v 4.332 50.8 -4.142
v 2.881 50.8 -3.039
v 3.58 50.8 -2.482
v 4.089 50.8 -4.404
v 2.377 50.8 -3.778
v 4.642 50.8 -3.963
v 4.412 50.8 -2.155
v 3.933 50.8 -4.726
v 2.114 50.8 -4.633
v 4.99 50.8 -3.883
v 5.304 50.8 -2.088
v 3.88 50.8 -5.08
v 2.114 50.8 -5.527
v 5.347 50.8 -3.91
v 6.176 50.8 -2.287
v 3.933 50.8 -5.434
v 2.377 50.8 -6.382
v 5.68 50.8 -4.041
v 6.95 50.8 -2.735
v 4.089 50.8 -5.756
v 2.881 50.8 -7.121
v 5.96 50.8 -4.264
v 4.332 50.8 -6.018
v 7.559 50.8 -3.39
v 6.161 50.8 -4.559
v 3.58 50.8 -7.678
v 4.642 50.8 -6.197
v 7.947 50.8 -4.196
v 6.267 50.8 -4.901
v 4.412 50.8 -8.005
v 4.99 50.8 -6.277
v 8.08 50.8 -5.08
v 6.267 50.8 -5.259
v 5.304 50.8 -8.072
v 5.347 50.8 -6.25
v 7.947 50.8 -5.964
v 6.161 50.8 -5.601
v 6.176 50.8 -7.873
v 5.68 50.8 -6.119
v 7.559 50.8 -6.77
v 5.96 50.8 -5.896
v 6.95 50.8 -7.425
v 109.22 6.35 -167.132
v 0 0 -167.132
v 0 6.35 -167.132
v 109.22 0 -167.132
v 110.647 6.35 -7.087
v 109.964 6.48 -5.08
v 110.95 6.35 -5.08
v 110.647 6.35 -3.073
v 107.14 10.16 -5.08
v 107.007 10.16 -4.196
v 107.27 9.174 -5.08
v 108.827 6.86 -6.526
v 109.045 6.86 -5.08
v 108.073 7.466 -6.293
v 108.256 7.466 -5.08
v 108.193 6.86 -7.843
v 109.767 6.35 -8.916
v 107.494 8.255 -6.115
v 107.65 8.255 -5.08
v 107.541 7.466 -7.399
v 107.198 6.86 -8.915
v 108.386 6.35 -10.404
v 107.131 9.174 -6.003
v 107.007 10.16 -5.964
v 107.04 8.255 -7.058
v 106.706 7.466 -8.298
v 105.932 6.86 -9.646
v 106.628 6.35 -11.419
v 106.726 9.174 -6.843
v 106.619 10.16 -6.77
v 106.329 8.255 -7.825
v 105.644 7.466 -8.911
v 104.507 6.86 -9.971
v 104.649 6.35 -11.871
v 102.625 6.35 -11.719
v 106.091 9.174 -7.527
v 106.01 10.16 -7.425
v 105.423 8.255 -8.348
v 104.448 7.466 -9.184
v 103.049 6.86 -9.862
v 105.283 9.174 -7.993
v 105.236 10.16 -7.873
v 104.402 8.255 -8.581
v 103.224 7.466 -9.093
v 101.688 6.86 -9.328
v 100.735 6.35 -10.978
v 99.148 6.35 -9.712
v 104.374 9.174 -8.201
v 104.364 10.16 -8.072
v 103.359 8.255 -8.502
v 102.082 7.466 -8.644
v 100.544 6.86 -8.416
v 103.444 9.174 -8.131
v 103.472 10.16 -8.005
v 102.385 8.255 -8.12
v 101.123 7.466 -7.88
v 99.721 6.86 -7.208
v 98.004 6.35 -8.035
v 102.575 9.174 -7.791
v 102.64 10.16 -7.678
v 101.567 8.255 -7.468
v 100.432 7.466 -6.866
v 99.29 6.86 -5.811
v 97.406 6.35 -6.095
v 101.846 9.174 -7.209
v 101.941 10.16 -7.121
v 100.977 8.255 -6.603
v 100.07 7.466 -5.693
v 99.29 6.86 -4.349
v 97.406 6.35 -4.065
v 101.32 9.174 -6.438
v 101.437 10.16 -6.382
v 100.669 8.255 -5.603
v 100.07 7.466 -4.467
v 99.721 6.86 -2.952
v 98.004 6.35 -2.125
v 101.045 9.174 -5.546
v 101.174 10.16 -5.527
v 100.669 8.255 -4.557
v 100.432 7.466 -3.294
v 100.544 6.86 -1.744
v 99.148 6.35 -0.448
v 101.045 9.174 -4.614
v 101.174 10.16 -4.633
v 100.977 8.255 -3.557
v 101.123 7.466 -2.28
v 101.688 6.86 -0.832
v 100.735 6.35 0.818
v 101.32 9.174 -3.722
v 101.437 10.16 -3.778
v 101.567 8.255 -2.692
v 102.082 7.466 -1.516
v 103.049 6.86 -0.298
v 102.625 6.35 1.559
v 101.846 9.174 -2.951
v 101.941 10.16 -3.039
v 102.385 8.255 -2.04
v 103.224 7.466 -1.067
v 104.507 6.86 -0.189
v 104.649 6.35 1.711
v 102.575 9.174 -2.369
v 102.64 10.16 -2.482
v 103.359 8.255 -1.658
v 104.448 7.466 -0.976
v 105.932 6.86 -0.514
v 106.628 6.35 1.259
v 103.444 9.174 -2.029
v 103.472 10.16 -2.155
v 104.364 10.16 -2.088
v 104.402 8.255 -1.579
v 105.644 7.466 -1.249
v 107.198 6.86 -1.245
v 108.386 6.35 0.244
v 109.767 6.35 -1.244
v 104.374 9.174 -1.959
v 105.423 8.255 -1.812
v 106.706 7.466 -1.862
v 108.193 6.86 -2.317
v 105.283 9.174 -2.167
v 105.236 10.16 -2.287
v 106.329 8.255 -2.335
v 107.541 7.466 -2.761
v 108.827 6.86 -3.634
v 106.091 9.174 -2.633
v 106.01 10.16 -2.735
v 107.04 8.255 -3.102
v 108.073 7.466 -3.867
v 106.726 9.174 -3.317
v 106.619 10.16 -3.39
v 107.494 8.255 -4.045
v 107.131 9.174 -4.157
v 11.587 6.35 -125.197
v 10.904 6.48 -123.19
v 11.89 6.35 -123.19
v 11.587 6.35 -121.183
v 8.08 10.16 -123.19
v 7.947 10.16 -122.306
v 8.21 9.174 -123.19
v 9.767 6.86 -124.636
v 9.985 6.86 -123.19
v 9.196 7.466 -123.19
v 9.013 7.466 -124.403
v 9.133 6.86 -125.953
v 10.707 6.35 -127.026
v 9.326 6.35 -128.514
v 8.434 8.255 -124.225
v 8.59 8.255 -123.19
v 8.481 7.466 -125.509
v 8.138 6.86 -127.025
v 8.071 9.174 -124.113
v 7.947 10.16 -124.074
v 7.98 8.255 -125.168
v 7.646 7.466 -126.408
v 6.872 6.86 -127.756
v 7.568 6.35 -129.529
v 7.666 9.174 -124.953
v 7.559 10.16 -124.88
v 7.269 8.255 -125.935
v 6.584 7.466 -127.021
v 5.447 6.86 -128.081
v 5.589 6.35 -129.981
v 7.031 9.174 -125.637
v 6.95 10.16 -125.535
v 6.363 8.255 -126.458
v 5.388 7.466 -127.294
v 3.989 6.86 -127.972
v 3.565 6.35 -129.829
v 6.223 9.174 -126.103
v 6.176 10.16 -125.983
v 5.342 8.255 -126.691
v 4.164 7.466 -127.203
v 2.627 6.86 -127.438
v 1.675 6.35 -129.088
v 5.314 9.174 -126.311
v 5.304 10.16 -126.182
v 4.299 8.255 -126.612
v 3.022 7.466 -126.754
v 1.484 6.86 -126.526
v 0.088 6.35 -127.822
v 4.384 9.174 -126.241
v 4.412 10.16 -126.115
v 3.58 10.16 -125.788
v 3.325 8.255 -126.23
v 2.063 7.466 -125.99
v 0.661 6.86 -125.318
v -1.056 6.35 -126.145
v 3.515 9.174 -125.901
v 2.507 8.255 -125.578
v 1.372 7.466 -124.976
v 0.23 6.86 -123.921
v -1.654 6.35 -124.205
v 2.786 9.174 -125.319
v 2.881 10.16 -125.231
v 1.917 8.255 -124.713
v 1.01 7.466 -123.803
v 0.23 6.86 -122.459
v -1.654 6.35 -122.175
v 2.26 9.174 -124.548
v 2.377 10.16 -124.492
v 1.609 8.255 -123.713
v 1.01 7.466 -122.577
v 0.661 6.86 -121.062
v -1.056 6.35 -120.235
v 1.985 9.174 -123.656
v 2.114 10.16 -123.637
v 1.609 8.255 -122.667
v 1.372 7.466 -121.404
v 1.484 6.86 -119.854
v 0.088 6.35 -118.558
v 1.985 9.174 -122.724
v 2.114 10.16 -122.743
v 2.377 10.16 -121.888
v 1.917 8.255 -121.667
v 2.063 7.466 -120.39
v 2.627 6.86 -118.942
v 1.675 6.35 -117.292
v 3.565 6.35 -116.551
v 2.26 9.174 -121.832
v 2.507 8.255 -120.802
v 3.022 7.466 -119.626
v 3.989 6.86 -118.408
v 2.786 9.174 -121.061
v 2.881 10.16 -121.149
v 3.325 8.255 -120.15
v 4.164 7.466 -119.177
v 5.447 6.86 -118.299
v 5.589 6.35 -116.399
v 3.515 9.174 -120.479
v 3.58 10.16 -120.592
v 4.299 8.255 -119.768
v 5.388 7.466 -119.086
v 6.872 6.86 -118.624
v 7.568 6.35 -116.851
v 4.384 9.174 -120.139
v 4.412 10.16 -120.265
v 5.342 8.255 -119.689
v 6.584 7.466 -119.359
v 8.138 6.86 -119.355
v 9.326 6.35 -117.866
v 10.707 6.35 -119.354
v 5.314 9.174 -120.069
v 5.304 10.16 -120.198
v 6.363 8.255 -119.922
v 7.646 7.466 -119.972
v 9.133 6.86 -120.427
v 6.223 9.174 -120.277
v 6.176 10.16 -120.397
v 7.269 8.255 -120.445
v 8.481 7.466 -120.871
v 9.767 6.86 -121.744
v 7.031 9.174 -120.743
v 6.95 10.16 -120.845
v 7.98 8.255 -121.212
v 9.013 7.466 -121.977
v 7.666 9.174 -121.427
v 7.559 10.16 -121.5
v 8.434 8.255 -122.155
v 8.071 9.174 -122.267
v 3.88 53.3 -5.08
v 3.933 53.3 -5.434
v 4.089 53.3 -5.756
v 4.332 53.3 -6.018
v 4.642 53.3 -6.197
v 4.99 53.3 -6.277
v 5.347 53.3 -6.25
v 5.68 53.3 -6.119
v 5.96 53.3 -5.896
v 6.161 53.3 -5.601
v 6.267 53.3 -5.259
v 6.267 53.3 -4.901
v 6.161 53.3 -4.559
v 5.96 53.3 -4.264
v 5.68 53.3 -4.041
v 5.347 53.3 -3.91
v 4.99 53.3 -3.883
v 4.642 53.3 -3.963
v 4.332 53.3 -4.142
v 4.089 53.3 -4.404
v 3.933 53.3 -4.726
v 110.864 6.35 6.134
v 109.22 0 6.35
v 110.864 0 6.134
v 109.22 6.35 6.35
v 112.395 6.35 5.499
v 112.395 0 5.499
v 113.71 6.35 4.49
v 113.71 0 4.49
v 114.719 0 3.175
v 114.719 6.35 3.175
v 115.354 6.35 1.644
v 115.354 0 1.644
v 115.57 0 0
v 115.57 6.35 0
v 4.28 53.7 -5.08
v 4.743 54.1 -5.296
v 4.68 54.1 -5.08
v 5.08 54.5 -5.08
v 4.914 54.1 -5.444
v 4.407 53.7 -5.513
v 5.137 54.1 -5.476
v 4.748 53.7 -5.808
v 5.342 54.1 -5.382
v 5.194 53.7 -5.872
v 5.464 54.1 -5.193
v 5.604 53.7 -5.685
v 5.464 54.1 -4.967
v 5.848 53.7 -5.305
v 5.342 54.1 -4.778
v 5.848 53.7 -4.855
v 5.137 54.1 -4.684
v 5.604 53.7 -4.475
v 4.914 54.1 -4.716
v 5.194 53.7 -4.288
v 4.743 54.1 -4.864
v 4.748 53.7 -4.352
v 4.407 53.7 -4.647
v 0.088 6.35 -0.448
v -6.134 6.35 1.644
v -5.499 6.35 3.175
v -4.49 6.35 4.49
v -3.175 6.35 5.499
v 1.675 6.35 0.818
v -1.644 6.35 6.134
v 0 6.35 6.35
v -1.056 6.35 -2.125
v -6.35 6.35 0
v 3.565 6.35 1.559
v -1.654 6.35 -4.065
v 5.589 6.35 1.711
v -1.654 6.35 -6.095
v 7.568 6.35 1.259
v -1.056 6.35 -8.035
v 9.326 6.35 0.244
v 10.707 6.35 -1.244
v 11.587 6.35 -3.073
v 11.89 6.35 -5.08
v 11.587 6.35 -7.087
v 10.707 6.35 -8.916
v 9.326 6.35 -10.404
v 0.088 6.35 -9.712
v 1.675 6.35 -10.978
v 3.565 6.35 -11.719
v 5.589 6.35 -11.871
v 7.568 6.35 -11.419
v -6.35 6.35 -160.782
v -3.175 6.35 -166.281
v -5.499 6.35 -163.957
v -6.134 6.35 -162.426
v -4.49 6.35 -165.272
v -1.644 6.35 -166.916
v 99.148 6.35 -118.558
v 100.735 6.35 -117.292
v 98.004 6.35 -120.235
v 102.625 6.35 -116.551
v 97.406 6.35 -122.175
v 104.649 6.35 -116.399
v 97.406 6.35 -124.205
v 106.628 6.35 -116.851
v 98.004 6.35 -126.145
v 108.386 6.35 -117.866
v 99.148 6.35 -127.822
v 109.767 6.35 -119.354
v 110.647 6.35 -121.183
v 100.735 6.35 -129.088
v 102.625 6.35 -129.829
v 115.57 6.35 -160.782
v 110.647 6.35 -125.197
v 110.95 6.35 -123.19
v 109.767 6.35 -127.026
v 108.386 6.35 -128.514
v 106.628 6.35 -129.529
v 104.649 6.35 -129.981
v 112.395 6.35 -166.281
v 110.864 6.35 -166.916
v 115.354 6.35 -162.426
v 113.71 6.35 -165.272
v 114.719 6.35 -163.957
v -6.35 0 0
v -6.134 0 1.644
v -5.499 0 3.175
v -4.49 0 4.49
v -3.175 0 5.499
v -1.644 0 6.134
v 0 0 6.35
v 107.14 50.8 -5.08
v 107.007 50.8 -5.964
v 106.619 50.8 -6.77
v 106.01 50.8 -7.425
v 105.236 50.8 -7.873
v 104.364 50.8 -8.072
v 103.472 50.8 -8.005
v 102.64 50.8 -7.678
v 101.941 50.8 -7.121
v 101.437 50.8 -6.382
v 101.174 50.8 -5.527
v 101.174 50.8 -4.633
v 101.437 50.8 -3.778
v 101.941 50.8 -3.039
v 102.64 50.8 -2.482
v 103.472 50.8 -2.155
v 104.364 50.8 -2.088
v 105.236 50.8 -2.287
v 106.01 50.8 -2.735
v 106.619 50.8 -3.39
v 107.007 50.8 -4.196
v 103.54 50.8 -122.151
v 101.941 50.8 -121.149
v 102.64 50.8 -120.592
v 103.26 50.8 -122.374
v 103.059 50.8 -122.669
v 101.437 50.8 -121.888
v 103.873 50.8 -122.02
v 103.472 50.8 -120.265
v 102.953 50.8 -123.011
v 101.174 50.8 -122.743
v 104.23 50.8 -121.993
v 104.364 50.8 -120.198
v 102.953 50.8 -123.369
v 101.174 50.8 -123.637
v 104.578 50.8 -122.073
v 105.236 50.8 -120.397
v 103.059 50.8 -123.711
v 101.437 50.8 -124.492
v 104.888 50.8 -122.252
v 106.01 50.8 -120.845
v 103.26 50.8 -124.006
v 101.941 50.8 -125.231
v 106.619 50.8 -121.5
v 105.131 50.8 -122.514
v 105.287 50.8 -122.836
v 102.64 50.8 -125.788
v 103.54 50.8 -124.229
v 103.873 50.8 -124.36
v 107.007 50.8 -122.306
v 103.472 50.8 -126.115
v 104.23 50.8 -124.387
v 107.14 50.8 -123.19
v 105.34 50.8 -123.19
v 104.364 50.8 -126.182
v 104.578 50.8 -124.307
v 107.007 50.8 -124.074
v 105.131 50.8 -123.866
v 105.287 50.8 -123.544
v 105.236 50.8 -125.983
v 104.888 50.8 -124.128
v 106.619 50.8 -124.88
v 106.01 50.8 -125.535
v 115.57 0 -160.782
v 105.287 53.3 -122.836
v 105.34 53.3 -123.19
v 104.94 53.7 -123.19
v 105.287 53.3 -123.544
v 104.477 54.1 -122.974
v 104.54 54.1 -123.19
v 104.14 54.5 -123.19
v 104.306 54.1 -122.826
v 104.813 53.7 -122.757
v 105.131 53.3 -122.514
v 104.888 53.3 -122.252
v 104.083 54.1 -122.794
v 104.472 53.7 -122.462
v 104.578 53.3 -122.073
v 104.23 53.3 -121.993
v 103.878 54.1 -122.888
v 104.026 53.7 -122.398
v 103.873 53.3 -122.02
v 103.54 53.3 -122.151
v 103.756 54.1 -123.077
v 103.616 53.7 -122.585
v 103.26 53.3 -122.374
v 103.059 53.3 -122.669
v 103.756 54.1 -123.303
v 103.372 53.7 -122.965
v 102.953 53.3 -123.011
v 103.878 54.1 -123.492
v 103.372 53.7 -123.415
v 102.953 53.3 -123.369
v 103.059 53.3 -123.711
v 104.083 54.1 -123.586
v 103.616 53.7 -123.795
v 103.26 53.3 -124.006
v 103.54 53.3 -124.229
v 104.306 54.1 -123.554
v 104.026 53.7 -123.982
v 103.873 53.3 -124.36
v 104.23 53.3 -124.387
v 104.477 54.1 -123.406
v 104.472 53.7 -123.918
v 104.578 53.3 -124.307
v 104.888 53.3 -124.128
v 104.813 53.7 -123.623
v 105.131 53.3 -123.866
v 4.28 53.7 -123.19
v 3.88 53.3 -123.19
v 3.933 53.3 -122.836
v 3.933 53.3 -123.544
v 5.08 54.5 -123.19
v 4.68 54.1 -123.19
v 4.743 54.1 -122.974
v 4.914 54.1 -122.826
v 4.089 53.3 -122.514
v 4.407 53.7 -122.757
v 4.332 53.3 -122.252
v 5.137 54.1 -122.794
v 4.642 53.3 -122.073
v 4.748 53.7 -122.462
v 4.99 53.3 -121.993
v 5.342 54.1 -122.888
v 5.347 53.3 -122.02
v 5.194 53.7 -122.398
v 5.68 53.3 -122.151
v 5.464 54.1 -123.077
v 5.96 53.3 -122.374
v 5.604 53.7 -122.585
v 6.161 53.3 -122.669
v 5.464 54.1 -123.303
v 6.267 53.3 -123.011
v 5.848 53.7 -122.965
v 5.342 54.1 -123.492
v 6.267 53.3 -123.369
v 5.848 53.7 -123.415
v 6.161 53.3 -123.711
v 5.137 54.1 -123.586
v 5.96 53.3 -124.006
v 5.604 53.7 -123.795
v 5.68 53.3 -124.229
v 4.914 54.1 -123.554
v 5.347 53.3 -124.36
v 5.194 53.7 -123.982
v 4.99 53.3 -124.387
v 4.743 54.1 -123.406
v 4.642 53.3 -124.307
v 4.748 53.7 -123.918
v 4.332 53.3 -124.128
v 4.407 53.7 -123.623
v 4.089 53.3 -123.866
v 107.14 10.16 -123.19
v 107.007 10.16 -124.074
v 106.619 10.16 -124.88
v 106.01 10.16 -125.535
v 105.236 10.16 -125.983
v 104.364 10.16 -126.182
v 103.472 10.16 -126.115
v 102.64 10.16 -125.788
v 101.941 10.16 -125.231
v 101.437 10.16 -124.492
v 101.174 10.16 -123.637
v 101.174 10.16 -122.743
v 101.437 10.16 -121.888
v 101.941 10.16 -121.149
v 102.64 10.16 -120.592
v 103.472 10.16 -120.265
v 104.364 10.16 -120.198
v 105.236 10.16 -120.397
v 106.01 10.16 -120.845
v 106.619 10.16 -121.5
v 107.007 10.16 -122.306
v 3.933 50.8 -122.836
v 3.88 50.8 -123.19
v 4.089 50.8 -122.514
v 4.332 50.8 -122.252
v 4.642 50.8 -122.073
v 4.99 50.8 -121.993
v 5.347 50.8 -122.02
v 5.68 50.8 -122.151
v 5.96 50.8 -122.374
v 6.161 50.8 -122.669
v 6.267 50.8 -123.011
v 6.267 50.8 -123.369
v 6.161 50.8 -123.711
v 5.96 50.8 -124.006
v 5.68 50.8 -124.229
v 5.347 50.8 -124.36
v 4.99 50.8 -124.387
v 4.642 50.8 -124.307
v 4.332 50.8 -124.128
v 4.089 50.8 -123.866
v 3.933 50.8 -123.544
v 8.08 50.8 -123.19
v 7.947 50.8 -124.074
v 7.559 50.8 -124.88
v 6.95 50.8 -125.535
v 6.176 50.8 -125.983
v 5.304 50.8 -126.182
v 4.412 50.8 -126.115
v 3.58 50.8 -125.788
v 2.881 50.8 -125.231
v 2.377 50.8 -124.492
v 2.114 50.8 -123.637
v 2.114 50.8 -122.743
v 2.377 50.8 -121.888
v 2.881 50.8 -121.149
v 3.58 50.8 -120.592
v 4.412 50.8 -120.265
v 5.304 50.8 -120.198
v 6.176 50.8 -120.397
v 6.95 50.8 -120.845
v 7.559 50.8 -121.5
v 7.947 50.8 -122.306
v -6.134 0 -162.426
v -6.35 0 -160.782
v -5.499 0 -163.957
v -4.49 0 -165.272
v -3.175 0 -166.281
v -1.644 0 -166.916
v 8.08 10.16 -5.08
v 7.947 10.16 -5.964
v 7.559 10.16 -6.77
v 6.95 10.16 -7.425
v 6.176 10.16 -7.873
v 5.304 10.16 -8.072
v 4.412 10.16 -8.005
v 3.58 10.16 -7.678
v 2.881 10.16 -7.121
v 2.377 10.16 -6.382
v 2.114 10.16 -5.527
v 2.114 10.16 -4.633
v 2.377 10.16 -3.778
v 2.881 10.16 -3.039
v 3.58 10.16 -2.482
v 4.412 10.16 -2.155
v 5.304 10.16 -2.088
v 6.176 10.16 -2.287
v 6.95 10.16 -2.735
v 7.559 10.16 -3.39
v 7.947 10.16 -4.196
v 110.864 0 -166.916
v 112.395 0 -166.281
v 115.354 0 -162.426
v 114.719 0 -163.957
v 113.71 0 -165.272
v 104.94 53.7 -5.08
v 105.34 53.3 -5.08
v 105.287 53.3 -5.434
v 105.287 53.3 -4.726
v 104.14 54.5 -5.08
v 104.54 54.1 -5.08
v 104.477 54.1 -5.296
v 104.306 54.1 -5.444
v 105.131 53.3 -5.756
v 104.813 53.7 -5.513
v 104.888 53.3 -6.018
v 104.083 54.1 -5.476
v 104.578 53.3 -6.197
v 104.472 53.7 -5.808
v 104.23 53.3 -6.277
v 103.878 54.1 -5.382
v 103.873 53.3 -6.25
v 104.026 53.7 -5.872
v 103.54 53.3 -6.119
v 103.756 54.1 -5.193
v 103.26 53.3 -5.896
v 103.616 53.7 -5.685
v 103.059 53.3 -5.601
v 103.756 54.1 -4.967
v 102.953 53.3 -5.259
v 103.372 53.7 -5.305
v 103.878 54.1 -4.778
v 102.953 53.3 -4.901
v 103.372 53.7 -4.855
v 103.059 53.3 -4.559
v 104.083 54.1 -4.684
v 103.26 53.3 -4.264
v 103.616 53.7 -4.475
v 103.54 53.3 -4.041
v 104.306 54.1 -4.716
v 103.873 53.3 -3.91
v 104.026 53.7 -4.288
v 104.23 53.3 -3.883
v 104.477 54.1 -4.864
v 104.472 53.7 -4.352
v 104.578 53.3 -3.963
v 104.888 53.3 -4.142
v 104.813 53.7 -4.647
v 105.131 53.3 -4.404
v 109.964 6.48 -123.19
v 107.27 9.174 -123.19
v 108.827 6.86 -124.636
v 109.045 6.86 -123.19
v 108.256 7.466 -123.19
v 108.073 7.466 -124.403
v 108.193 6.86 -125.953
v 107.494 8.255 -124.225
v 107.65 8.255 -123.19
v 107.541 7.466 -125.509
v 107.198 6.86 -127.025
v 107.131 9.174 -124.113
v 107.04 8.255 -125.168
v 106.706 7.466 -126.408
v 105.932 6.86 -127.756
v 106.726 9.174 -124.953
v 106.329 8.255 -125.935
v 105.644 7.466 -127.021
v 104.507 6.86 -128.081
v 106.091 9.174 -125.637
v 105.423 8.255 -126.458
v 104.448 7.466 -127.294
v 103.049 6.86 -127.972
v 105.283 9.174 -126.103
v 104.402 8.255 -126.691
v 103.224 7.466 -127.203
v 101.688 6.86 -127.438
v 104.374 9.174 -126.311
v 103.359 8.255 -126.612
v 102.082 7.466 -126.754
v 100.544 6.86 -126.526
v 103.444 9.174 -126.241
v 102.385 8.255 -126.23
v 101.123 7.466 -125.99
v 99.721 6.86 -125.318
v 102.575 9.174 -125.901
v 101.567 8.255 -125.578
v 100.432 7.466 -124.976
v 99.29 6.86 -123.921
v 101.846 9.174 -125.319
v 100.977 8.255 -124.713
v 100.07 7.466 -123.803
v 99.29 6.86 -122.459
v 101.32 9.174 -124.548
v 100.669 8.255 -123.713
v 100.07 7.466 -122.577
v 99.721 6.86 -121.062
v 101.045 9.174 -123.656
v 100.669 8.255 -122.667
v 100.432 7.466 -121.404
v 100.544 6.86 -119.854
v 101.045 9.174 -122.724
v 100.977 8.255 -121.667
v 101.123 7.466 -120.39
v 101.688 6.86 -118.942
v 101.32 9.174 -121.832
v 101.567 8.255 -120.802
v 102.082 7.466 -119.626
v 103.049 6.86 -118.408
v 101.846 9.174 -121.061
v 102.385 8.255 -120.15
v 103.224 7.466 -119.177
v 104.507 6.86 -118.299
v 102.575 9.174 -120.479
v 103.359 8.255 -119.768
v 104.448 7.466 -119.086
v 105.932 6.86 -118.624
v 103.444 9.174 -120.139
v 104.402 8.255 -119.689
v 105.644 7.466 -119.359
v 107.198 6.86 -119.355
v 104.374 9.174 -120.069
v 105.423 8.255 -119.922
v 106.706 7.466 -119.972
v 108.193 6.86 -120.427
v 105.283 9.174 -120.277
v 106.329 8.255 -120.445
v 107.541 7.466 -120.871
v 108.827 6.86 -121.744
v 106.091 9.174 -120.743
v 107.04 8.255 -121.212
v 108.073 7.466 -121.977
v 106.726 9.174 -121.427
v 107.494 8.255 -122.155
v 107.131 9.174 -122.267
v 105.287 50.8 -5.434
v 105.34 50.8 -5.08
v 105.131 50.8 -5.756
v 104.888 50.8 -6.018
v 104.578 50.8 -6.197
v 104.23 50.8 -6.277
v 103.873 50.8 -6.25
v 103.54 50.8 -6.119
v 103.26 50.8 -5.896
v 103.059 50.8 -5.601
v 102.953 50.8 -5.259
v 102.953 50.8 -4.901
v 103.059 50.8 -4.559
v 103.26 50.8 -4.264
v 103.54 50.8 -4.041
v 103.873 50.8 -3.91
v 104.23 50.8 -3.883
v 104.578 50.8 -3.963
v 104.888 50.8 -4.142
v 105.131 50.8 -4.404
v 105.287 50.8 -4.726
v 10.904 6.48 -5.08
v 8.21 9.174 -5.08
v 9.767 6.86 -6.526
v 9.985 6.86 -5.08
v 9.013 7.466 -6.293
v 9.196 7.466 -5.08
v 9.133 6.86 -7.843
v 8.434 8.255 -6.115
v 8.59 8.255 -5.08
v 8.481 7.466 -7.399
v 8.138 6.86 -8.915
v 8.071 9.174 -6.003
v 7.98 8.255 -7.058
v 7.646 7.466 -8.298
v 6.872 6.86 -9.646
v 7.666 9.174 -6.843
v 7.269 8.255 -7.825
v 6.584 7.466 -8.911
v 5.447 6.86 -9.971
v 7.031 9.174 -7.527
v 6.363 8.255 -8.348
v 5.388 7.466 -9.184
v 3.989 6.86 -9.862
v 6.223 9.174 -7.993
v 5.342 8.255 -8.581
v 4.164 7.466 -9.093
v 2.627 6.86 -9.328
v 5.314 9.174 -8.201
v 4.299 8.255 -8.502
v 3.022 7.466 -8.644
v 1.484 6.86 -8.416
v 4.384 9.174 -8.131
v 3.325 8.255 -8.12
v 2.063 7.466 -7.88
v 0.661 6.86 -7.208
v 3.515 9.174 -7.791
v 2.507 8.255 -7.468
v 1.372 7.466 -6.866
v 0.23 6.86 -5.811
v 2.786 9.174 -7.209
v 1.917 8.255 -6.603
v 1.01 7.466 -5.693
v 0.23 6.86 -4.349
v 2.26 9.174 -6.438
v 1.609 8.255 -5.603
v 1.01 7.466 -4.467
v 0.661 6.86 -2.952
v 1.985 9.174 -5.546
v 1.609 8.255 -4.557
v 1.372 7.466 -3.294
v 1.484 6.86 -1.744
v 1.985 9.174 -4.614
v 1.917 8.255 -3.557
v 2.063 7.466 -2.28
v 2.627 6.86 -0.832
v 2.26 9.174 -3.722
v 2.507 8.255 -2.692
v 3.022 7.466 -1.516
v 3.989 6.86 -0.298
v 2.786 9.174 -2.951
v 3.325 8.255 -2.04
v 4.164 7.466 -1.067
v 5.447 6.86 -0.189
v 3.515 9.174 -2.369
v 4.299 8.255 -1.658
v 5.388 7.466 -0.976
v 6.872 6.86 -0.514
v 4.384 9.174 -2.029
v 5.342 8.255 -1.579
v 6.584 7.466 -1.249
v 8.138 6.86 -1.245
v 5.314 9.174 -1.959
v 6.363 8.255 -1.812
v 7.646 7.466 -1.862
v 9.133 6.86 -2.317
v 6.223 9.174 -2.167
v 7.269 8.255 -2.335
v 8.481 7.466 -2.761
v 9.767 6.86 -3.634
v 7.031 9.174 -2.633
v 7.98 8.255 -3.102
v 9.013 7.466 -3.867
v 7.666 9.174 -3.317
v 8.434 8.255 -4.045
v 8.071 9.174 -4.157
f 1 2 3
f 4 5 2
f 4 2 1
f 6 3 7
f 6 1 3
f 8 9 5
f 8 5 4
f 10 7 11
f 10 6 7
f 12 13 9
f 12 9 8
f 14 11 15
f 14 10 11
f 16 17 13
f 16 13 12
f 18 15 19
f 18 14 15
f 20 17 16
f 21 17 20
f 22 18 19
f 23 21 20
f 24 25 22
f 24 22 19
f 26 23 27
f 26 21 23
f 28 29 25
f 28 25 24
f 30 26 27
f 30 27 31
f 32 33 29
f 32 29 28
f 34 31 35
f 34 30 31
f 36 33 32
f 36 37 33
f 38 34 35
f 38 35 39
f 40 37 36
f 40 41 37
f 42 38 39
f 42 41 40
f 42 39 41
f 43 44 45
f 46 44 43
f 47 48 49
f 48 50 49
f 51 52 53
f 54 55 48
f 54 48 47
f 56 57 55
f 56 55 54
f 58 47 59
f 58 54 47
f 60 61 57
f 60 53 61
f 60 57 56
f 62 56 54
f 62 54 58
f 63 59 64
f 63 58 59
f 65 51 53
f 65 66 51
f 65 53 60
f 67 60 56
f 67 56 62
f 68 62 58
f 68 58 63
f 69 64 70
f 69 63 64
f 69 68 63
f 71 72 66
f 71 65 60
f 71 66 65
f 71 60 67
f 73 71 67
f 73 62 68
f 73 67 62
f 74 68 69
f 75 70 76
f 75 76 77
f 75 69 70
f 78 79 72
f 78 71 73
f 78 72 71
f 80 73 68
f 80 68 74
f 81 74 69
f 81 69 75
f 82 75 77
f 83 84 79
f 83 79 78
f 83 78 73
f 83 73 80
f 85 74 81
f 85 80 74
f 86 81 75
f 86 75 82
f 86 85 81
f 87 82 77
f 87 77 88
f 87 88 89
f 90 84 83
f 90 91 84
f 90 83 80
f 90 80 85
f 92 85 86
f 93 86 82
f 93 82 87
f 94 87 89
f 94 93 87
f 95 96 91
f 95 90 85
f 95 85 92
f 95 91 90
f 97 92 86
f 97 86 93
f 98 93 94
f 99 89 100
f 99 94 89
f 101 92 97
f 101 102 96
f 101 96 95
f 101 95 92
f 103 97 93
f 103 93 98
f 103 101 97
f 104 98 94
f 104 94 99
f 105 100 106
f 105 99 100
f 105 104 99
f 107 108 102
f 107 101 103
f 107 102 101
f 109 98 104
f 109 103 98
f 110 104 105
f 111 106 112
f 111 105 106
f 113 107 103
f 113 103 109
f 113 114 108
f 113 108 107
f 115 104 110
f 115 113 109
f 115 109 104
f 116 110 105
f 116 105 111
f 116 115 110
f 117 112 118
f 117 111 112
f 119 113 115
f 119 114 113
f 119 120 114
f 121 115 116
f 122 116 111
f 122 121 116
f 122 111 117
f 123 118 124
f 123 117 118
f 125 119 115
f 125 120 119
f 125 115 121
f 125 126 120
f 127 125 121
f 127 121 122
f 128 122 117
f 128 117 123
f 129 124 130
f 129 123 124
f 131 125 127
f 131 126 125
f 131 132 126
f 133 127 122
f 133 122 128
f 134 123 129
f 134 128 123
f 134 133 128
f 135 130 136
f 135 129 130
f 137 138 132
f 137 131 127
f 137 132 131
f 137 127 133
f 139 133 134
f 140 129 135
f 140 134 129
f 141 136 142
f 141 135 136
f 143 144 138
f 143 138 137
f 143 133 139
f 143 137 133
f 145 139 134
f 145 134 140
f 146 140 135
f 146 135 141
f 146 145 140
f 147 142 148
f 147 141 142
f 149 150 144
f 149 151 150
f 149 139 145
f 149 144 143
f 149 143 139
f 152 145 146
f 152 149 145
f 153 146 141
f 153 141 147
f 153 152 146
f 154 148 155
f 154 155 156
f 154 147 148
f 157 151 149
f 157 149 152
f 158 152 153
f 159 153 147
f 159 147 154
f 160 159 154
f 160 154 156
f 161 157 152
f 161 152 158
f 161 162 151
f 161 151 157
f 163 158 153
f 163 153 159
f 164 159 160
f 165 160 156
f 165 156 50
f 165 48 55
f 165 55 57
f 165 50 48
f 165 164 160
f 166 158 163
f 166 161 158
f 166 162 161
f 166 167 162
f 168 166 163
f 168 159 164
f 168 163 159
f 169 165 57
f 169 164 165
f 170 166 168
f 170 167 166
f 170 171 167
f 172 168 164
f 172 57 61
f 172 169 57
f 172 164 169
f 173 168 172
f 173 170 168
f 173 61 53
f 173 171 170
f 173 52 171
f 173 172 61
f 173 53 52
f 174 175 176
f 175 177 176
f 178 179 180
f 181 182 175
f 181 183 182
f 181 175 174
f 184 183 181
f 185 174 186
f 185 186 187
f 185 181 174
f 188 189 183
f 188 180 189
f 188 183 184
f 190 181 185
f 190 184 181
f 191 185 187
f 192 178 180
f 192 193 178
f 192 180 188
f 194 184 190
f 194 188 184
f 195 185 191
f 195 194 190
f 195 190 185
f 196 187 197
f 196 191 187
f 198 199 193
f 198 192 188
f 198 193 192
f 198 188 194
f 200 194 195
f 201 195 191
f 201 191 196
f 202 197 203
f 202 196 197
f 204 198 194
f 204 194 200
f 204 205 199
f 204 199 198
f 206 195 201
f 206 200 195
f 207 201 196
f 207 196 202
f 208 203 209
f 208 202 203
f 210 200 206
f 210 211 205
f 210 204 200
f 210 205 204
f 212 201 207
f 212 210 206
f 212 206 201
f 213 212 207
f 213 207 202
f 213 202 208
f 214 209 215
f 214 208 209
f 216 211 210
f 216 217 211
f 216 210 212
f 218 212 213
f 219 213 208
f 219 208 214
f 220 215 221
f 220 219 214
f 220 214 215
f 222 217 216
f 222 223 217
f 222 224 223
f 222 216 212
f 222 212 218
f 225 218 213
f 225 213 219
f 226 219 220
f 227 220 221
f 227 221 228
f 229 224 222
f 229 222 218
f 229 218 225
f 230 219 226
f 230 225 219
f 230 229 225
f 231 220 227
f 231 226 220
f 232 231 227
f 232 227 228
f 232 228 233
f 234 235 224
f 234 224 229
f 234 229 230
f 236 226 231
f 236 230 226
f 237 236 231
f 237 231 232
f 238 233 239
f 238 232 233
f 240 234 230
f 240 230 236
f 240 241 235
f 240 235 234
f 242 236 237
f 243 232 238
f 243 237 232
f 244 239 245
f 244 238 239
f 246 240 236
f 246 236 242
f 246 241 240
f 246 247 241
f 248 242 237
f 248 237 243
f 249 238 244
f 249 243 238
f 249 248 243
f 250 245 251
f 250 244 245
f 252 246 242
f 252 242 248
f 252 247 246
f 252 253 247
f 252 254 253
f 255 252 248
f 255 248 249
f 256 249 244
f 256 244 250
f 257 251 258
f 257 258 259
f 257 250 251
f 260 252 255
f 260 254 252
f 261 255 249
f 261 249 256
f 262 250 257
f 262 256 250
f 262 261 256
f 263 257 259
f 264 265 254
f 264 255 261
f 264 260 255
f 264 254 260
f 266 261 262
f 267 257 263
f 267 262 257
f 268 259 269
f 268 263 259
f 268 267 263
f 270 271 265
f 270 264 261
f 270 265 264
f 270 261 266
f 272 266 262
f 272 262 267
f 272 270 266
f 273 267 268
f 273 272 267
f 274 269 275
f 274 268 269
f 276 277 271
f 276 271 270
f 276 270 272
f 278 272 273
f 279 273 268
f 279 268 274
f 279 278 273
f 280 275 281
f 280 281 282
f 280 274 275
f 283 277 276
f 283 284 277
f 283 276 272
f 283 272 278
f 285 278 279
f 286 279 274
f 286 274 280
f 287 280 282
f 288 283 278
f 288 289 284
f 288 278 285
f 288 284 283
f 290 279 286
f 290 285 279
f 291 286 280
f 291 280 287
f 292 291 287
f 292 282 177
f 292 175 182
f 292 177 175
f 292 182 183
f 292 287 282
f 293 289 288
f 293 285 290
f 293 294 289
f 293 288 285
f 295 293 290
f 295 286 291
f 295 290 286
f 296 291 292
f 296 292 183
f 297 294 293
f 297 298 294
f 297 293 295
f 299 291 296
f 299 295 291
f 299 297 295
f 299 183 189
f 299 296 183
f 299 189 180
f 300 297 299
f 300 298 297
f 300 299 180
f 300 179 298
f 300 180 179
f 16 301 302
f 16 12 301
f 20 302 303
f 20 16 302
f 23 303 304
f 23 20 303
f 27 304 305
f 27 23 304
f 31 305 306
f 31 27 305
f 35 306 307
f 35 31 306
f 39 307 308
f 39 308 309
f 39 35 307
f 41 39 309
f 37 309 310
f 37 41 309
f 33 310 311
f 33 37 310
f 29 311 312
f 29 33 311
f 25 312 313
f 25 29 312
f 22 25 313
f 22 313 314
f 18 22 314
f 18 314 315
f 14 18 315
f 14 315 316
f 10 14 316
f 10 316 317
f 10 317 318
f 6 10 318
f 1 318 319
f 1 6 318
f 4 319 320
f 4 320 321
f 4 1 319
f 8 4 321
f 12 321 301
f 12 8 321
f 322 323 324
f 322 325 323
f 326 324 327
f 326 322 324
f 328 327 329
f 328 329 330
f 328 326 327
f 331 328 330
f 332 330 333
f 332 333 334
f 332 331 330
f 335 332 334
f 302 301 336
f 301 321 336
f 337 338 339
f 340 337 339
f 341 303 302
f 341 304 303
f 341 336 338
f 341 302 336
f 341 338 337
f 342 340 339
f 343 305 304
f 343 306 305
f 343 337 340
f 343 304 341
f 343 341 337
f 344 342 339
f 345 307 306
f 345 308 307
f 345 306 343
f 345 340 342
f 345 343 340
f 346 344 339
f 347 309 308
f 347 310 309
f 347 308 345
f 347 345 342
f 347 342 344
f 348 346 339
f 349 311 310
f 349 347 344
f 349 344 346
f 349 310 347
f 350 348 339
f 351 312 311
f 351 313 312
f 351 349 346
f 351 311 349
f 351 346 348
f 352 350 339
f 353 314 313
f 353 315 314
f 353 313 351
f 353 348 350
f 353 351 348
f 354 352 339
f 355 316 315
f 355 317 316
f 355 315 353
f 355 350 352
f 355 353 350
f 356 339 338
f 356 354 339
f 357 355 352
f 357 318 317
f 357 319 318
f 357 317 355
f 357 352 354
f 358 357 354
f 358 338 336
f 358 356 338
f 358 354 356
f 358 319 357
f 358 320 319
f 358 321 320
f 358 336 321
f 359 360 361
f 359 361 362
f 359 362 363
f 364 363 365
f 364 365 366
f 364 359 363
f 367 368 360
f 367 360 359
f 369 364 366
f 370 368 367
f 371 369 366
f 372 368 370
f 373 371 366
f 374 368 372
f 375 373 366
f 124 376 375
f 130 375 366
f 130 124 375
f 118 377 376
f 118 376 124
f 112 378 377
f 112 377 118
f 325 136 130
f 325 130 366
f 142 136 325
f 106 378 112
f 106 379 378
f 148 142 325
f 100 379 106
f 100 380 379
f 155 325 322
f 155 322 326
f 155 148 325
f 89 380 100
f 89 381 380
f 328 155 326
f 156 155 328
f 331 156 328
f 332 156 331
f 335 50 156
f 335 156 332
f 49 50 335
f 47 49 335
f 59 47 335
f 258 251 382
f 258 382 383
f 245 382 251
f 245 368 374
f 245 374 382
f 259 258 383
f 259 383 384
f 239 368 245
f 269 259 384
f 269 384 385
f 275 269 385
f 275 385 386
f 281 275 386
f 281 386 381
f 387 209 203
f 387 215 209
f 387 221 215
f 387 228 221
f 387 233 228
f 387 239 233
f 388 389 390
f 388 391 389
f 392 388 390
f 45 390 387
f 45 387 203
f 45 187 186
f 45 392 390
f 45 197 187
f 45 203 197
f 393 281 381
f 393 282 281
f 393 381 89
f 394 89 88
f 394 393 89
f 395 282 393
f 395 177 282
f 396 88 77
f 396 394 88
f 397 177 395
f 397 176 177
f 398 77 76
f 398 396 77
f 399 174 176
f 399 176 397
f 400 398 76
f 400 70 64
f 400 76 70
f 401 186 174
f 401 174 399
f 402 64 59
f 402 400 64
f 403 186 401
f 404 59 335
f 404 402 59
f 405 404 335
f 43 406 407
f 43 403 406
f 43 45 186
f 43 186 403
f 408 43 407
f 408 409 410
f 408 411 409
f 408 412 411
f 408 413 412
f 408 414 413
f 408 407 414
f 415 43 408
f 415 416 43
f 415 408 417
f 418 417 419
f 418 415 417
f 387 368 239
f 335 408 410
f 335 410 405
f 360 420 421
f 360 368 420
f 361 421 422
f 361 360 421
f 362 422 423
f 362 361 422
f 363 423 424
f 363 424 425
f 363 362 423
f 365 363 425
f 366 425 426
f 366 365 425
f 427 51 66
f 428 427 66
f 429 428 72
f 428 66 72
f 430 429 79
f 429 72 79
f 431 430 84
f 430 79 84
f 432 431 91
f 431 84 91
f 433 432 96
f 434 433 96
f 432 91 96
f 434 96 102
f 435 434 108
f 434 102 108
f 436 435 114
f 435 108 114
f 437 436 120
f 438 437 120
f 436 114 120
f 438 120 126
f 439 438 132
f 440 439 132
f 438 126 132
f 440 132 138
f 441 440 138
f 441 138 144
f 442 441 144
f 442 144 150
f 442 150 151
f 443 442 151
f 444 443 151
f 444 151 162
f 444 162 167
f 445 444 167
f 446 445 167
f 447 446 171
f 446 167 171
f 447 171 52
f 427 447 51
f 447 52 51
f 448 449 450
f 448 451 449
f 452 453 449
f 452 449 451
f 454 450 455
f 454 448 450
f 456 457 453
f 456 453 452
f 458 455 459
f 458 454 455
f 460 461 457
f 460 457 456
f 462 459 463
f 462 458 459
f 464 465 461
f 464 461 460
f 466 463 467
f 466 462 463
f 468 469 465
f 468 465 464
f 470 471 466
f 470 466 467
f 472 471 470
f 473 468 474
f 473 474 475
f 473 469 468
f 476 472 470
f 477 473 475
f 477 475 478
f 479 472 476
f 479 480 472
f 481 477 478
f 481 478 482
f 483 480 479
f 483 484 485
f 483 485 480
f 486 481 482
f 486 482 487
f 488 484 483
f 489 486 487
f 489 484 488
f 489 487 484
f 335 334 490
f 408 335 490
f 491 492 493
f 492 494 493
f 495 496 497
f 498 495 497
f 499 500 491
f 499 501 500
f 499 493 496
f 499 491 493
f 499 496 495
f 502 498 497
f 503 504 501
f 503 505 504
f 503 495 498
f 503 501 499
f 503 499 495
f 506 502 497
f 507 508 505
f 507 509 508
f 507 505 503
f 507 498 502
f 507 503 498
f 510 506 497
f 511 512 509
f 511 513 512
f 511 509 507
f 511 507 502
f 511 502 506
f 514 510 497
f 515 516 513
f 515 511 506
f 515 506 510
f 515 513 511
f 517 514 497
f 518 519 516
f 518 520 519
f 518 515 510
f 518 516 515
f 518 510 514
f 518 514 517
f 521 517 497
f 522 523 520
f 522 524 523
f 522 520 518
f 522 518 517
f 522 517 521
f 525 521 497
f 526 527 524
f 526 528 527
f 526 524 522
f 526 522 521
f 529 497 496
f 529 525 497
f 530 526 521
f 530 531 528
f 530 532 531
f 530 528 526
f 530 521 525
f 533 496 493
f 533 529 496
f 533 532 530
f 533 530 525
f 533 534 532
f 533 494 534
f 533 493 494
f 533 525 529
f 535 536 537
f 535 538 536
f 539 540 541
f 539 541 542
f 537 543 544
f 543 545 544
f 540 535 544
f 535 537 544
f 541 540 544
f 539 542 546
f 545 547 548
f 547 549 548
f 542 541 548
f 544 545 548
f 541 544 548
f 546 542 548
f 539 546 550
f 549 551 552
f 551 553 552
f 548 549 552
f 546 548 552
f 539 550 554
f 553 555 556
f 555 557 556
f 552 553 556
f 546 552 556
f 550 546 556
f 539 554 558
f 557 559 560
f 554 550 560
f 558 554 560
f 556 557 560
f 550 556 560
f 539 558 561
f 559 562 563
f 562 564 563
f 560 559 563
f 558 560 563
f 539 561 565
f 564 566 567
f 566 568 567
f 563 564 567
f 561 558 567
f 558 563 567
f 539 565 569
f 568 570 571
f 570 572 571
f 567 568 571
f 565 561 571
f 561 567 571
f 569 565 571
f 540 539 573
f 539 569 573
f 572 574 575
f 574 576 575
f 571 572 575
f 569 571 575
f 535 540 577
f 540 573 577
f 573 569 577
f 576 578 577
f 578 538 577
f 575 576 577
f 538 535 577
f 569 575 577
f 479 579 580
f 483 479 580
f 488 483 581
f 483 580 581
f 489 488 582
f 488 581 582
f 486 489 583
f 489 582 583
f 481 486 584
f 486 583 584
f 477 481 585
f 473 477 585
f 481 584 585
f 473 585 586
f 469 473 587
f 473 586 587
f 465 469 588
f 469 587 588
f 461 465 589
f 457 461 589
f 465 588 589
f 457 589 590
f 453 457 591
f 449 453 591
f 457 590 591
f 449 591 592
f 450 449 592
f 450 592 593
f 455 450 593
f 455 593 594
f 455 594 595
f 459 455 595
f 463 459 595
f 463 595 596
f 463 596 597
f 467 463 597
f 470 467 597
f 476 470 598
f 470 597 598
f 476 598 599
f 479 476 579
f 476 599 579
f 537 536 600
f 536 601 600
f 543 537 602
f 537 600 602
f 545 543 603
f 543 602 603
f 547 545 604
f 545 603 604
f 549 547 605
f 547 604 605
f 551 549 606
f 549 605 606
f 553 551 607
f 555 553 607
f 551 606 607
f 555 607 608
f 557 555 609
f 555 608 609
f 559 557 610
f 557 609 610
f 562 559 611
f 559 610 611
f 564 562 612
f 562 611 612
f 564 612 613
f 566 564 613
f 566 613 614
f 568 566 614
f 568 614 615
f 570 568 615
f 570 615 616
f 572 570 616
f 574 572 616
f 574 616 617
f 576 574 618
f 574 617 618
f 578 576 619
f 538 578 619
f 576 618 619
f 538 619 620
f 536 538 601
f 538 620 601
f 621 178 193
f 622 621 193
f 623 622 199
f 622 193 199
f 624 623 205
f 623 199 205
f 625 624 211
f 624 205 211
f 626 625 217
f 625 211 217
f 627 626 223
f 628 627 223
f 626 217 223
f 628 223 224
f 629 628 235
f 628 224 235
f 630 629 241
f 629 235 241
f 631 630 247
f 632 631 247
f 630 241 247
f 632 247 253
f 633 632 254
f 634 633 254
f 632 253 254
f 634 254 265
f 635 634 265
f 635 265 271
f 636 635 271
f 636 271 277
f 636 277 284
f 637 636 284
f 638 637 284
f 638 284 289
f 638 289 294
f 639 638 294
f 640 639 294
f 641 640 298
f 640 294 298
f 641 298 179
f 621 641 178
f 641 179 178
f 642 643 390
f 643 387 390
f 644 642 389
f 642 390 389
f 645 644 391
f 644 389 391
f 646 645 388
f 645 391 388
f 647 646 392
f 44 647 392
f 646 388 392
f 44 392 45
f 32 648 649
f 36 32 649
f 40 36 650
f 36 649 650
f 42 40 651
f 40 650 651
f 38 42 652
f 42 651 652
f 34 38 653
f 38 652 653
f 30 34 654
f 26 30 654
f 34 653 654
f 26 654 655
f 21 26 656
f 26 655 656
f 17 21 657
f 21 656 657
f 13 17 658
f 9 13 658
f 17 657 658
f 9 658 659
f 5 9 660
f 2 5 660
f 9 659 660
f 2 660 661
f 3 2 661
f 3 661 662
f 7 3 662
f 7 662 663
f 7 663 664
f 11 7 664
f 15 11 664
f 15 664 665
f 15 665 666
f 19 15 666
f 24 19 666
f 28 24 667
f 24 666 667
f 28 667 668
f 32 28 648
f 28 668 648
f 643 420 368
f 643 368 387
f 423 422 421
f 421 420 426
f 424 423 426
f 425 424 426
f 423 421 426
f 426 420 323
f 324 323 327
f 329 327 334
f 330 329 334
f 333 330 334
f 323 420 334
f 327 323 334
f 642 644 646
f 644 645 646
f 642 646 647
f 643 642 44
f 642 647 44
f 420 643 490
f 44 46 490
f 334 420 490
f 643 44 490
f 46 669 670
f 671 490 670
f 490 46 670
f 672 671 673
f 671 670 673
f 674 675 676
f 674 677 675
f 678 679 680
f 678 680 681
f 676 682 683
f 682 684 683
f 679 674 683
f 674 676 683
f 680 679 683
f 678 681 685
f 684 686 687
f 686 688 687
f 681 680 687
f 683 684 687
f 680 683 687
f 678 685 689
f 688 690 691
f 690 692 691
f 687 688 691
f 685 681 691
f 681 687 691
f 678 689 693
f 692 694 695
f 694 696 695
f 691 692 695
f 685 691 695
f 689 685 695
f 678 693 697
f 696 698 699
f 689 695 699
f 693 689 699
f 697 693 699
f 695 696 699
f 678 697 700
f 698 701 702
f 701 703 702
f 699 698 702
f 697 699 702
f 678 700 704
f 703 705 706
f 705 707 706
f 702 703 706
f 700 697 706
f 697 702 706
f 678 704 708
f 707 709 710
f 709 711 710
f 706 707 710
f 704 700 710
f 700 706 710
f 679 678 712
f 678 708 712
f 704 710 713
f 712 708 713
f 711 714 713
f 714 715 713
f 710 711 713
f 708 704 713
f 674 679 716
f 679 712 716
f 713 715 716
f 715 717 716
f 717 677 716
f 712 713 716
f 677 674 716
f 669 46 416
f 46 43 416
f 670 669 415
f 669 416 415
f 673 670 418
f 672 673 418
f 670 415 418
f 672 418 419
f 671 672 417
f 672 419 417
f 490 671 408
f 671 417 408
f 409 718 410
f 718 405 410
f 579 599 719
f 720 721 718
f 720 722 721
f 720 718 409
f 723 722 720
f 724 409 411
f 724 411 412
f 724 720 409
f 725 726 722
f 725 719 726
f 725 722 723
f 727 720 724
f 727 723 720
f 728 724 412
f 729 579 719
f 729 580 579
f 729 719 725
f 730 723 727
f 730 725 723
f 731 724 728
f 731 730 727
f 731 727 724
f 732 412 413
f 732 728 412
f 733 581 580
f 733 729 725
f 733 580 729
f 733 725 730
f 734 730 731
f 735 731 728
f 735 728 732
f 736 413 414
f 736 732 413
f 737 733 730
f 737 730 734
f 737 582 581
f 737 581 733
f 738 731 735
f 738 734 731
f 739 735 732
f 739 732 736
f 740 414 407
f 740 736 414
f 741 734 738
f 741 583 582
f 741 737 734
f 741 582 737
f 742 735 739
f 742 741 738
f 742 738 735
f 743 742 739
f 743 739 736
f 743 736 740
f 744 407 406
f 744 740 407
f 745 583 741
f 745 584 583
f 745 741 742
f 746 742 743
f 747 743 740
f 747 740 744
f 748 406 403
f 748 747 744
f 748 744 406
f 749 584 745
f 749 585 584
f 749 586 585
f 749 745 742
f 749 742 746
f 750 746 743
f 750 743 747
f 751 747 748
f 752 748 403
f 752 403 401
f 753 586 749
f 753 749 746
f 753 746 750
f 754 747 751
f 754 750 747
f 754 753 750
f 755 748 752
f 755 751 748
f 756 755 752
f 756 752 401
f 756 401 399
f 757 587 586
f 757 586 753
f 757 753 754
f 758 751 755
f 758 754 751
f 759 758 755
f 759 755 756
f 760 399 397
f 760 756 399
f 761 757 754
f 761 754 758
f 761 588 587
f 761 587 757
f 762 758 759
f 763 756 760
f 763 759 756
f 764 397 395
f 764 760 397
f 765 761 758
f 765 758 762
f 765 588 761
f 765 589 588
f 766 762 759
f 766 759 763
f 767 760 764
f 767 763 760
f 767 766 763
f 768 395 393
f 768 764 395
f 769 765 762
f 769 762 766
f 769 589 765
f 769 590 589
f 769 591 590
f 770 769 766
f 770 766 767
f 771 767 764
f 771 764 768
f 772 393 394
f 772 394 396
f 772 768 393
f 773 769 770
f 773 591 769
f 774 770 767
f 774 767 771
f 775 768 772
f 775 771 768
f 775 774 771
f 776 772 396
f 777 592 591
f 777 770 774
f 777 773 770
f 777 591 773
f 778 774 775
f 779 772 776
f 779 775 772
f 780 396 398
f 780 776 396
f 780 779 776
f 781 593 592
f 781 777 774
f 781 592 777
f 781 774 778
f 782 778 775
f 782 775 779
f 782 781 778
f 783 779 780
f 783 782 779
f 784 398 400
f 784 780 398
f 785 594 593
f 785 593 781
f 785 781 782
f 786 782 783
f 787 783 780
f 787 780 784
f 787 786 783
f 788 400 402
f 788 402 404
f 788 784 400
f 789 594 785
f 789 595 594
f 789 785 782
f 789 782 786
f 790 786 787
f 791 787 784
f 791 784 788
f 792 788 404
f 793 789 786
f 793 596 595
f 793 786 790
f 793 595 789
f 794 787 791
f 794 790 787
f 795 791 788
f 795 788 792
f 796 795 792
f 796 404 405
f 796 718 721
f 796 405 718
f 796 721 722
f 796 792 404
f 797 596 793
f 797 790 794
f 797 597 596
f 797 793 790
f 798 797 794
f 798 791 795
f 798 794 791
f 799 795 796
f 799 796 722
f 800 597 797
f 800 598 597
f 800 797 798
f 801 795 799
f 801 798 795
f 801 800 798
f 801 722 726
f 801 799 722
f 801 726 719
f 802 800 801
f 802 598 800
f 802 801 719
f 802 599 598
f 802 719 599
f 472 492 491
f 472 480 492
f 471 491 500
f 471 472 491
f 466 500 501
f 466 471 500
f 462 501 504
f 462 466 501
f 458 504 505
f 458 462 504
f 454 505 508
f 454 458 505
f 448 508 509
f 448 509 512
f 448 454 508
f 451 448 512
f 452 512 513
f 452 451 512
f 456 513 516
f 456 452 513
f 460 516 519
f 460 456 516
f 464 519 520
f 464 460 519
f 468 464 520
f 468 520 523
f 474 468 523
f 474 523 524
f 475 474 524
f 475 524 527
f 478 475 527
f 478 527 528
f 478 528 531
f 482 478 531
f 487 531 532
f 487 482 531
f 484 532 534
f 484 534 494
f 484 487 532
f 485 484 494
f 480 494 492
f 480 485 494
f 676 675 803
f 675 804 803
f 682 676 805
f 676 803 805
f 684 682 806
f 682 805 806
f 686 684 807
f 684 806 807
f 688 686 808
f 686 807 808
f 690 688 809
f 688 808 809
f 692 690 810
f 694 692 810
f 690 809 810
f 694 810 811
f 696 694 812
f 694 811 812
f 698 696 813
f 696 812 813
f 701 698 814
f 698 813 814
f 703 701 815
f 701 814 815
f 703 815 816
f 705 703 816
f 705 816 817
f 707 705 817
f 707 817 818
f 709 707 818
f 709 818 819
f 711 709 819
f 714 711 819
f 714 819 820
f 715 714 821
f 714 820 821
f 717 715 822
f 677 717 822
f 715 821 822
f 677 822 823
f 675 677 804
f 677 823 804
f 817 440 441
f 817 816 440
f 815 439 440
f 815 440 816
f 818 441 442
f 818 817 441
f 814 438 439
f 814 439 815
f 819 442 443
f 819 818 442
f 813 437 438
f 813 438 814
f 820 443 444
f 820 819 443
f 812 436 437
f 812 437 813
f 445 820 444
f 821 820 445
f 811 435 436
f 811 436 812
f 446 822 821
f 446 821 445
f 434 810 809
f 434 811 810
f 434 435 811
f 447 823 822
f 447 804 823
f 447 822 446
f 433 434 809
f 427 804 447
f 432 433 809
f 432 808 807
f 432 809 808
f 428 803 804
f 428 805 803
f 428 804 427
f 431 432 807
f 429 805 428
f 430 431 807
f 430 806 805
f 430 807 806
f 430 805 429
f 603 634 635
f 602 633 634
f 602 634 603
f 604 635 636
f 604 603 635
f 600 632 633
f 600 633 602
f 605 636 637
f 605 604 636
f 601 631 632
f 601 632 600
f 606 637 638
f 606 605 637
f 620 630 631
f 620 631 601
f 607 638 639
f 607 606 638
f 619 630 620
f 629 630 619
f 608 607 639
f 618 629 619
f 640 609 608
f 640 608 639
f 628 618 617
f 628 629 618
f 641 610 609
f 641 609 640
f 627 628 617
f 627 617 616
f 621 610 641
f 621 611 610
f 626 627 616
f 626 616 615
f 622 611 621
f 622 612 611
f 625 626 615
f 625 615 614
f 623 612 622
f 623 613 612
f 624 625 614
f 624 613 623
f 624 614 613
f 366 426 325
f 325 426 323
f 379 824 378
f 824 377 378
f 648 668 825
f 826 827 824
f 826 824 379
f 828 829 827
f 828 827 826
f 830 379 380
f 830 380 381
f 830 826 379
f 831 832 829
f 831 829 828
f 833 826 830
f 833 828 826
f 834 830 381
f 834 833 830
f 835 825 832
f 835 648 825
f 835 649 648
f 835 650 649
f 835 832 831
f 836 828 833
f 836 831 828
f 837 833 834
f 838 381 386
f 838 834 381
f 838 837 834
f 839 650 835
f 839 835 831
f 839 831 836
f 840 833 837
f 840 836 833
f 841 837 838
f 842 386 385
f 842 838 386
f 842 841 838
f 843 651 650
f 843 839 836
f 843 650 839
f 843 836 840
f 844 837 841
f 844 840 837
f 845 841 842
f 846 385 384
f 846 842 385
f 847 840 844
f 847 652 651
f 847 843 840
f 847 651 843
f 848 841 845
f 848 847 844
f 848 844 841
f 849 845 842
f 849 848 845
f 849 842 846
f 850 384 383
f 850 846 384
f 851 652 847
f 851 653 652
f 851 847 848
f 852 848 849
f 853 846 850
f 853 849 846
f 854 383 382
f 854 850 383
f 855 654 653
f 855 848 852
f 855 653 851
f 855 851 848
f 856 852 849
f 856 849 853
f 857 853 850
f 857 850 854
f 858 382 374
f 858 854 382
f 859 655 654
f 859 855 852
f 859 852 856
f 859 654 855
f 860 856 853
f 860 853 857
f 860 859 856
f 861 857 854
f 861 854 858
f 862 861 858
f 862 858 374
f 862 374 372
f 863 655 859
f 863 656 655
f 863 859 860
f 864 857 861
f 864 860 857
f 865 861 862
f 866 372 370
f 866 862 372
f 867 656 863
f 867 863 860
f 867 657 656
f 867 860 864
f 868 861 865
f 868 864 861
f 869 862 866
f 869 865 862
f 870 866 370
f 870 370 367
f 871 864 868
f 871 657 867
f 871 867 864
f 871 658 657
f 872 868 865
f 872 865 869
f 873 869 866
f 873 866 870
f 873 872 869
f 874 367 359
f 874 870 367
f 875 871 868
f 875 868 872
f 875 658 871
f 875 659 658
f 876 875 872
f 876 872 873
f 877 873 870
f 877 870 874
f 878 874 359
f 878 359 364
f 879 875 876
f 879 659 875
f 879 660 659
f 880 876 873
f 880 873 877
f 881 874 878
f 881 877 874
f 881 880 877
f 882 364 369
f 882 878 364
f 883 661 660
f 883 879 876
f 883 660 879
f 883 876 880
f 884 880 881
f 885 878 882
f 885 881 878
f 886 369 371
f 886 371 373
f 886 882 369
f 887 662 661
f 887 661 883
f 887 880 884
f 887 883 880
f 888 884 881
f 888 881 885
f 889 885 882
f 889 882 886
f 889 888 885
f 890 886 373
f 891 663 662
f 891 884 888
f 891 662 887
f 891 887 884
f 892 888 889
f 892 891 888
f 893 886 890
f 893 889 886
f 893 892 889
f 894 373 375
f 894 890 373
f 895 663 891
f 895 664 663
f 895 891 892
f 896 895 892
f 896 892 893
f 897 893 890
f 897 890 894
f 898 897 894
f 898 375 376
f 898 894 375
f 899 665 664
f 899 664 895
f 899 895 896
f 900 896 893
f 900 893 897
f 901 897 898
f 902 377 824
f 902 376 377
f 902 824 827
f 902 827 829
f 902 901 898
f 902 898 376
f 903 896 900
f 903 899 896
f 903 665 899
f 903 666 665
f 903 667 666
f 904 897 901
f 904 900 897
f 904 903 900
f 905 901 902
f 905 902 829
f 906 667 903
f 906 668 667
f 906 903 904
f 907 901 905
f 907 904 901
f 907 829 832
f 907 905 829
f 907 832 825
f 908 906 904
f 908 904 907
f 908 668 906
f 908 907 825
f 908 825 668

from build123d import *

# Parameters (mm, degrees)
SKETCH1_W           = 121.92
SKETCH1_H           = 173.482
BOSS_EXTRUDE1_DEPTH = 6.35
SKETCH2_R           = 3
BOSS_EXTRUDE2_DEPTH = 44.45
FILLET1_R           = 6.35
FILLET2_R           = 3.81


with BuildPart() as part:
    # Sketch1 → Boss-Extrude1 (new body)
    with BuildSketch(Plane(origin=(0, 0, 0), x_dir=(1, 0, 0), z_dir=(0, 1, 0))):
        with Locations((54.61, 80.391)):
            Rectangle(SKETCH1_W, SKETCH1_H)
    extrude(amount=BOSS_EXTRUDE1_DEPTH)

    # Sketch2 → Boss-Extrude2 (add)
    with BuildSketch(Plane(origin=(0, 6.35, 0), x_dir=(1, 0, 0), z_dir=(0, 1, 0))):
        with Locations((104.14, 5.08)):
            Circle(SKETCH2_R)
        with Locations((104.14, 123.19)):
            Circle(SKETCH2_R)
        with Locations((5.08, 123.19)):
            Circle(SKETCH2_R)
        with Locations((5.08, 5.08)):
            Circle(SKETCH2_R)
    extrude(amount=BOSS_EXTRUDE2_DEPTH)

    # Fillet1
    fillet1_edges = [part.edges().sort_by_distance(p)[0] for p in [
        (-6.35, 3.175, -167.132),
        (115.57, 3.175, -167.132),
        (115.57, 3.175, 6.35),
        (-6.35, 3.175, 6.35),
    ]]
    fillet(fillet1_edges, radius=FILLET1_R)

    # Fillet2
    fillet2_edges = [part.edges().sort_by_distance(p)[0] for p in [
        (101.14, 6.35, -5.08),
        (101.14, 6.35, -123.19),
        (2.08, 6.35, -123.19),
        (2.08, 6.35, -5.08),
    ]]
    fillet(fillet2_edges, radius=FILLET2_R)

    # Sketch3 → Revolve1 (revolve)
    with BuildSketch(Plane.XY.offset(-5.08)):
        Polygon((3.880000114, 50.8), (5.08, 50.8), (5.08, 54.499999886), (3.880000114, 53.3), align=None)
    revolve1 = revolve(axis=Axis((5.08, 50.8, -5.08), (0, -1, 0)))

    # Mirror1: Revolve1 across plane
    add(revolve1.mirror(Plane.XY.offset(-64.135)))

    # Mirror2: Revolve1 across plane
    add(revolve1.mirror(Plane.ZY.offset(-54.61)))

    # Mirror2 copy 1 sketch → Mirror2 copy 1 (revolve)
    with BuildSketch(Plane(origin=(109.22, 0, -123.19), x_dir=(-1, 0, 0), z_dir=(0, 0, -1))):
        Polygon((3.880000114, 50.8), (5.08, 50.8), (5.08, 54.499999886), (3.880000114, 53.3), align=None)
    revolve(axis=Axis((104.14, 50.8, -123.19), (0, -1, 0)))


solid = part.part
